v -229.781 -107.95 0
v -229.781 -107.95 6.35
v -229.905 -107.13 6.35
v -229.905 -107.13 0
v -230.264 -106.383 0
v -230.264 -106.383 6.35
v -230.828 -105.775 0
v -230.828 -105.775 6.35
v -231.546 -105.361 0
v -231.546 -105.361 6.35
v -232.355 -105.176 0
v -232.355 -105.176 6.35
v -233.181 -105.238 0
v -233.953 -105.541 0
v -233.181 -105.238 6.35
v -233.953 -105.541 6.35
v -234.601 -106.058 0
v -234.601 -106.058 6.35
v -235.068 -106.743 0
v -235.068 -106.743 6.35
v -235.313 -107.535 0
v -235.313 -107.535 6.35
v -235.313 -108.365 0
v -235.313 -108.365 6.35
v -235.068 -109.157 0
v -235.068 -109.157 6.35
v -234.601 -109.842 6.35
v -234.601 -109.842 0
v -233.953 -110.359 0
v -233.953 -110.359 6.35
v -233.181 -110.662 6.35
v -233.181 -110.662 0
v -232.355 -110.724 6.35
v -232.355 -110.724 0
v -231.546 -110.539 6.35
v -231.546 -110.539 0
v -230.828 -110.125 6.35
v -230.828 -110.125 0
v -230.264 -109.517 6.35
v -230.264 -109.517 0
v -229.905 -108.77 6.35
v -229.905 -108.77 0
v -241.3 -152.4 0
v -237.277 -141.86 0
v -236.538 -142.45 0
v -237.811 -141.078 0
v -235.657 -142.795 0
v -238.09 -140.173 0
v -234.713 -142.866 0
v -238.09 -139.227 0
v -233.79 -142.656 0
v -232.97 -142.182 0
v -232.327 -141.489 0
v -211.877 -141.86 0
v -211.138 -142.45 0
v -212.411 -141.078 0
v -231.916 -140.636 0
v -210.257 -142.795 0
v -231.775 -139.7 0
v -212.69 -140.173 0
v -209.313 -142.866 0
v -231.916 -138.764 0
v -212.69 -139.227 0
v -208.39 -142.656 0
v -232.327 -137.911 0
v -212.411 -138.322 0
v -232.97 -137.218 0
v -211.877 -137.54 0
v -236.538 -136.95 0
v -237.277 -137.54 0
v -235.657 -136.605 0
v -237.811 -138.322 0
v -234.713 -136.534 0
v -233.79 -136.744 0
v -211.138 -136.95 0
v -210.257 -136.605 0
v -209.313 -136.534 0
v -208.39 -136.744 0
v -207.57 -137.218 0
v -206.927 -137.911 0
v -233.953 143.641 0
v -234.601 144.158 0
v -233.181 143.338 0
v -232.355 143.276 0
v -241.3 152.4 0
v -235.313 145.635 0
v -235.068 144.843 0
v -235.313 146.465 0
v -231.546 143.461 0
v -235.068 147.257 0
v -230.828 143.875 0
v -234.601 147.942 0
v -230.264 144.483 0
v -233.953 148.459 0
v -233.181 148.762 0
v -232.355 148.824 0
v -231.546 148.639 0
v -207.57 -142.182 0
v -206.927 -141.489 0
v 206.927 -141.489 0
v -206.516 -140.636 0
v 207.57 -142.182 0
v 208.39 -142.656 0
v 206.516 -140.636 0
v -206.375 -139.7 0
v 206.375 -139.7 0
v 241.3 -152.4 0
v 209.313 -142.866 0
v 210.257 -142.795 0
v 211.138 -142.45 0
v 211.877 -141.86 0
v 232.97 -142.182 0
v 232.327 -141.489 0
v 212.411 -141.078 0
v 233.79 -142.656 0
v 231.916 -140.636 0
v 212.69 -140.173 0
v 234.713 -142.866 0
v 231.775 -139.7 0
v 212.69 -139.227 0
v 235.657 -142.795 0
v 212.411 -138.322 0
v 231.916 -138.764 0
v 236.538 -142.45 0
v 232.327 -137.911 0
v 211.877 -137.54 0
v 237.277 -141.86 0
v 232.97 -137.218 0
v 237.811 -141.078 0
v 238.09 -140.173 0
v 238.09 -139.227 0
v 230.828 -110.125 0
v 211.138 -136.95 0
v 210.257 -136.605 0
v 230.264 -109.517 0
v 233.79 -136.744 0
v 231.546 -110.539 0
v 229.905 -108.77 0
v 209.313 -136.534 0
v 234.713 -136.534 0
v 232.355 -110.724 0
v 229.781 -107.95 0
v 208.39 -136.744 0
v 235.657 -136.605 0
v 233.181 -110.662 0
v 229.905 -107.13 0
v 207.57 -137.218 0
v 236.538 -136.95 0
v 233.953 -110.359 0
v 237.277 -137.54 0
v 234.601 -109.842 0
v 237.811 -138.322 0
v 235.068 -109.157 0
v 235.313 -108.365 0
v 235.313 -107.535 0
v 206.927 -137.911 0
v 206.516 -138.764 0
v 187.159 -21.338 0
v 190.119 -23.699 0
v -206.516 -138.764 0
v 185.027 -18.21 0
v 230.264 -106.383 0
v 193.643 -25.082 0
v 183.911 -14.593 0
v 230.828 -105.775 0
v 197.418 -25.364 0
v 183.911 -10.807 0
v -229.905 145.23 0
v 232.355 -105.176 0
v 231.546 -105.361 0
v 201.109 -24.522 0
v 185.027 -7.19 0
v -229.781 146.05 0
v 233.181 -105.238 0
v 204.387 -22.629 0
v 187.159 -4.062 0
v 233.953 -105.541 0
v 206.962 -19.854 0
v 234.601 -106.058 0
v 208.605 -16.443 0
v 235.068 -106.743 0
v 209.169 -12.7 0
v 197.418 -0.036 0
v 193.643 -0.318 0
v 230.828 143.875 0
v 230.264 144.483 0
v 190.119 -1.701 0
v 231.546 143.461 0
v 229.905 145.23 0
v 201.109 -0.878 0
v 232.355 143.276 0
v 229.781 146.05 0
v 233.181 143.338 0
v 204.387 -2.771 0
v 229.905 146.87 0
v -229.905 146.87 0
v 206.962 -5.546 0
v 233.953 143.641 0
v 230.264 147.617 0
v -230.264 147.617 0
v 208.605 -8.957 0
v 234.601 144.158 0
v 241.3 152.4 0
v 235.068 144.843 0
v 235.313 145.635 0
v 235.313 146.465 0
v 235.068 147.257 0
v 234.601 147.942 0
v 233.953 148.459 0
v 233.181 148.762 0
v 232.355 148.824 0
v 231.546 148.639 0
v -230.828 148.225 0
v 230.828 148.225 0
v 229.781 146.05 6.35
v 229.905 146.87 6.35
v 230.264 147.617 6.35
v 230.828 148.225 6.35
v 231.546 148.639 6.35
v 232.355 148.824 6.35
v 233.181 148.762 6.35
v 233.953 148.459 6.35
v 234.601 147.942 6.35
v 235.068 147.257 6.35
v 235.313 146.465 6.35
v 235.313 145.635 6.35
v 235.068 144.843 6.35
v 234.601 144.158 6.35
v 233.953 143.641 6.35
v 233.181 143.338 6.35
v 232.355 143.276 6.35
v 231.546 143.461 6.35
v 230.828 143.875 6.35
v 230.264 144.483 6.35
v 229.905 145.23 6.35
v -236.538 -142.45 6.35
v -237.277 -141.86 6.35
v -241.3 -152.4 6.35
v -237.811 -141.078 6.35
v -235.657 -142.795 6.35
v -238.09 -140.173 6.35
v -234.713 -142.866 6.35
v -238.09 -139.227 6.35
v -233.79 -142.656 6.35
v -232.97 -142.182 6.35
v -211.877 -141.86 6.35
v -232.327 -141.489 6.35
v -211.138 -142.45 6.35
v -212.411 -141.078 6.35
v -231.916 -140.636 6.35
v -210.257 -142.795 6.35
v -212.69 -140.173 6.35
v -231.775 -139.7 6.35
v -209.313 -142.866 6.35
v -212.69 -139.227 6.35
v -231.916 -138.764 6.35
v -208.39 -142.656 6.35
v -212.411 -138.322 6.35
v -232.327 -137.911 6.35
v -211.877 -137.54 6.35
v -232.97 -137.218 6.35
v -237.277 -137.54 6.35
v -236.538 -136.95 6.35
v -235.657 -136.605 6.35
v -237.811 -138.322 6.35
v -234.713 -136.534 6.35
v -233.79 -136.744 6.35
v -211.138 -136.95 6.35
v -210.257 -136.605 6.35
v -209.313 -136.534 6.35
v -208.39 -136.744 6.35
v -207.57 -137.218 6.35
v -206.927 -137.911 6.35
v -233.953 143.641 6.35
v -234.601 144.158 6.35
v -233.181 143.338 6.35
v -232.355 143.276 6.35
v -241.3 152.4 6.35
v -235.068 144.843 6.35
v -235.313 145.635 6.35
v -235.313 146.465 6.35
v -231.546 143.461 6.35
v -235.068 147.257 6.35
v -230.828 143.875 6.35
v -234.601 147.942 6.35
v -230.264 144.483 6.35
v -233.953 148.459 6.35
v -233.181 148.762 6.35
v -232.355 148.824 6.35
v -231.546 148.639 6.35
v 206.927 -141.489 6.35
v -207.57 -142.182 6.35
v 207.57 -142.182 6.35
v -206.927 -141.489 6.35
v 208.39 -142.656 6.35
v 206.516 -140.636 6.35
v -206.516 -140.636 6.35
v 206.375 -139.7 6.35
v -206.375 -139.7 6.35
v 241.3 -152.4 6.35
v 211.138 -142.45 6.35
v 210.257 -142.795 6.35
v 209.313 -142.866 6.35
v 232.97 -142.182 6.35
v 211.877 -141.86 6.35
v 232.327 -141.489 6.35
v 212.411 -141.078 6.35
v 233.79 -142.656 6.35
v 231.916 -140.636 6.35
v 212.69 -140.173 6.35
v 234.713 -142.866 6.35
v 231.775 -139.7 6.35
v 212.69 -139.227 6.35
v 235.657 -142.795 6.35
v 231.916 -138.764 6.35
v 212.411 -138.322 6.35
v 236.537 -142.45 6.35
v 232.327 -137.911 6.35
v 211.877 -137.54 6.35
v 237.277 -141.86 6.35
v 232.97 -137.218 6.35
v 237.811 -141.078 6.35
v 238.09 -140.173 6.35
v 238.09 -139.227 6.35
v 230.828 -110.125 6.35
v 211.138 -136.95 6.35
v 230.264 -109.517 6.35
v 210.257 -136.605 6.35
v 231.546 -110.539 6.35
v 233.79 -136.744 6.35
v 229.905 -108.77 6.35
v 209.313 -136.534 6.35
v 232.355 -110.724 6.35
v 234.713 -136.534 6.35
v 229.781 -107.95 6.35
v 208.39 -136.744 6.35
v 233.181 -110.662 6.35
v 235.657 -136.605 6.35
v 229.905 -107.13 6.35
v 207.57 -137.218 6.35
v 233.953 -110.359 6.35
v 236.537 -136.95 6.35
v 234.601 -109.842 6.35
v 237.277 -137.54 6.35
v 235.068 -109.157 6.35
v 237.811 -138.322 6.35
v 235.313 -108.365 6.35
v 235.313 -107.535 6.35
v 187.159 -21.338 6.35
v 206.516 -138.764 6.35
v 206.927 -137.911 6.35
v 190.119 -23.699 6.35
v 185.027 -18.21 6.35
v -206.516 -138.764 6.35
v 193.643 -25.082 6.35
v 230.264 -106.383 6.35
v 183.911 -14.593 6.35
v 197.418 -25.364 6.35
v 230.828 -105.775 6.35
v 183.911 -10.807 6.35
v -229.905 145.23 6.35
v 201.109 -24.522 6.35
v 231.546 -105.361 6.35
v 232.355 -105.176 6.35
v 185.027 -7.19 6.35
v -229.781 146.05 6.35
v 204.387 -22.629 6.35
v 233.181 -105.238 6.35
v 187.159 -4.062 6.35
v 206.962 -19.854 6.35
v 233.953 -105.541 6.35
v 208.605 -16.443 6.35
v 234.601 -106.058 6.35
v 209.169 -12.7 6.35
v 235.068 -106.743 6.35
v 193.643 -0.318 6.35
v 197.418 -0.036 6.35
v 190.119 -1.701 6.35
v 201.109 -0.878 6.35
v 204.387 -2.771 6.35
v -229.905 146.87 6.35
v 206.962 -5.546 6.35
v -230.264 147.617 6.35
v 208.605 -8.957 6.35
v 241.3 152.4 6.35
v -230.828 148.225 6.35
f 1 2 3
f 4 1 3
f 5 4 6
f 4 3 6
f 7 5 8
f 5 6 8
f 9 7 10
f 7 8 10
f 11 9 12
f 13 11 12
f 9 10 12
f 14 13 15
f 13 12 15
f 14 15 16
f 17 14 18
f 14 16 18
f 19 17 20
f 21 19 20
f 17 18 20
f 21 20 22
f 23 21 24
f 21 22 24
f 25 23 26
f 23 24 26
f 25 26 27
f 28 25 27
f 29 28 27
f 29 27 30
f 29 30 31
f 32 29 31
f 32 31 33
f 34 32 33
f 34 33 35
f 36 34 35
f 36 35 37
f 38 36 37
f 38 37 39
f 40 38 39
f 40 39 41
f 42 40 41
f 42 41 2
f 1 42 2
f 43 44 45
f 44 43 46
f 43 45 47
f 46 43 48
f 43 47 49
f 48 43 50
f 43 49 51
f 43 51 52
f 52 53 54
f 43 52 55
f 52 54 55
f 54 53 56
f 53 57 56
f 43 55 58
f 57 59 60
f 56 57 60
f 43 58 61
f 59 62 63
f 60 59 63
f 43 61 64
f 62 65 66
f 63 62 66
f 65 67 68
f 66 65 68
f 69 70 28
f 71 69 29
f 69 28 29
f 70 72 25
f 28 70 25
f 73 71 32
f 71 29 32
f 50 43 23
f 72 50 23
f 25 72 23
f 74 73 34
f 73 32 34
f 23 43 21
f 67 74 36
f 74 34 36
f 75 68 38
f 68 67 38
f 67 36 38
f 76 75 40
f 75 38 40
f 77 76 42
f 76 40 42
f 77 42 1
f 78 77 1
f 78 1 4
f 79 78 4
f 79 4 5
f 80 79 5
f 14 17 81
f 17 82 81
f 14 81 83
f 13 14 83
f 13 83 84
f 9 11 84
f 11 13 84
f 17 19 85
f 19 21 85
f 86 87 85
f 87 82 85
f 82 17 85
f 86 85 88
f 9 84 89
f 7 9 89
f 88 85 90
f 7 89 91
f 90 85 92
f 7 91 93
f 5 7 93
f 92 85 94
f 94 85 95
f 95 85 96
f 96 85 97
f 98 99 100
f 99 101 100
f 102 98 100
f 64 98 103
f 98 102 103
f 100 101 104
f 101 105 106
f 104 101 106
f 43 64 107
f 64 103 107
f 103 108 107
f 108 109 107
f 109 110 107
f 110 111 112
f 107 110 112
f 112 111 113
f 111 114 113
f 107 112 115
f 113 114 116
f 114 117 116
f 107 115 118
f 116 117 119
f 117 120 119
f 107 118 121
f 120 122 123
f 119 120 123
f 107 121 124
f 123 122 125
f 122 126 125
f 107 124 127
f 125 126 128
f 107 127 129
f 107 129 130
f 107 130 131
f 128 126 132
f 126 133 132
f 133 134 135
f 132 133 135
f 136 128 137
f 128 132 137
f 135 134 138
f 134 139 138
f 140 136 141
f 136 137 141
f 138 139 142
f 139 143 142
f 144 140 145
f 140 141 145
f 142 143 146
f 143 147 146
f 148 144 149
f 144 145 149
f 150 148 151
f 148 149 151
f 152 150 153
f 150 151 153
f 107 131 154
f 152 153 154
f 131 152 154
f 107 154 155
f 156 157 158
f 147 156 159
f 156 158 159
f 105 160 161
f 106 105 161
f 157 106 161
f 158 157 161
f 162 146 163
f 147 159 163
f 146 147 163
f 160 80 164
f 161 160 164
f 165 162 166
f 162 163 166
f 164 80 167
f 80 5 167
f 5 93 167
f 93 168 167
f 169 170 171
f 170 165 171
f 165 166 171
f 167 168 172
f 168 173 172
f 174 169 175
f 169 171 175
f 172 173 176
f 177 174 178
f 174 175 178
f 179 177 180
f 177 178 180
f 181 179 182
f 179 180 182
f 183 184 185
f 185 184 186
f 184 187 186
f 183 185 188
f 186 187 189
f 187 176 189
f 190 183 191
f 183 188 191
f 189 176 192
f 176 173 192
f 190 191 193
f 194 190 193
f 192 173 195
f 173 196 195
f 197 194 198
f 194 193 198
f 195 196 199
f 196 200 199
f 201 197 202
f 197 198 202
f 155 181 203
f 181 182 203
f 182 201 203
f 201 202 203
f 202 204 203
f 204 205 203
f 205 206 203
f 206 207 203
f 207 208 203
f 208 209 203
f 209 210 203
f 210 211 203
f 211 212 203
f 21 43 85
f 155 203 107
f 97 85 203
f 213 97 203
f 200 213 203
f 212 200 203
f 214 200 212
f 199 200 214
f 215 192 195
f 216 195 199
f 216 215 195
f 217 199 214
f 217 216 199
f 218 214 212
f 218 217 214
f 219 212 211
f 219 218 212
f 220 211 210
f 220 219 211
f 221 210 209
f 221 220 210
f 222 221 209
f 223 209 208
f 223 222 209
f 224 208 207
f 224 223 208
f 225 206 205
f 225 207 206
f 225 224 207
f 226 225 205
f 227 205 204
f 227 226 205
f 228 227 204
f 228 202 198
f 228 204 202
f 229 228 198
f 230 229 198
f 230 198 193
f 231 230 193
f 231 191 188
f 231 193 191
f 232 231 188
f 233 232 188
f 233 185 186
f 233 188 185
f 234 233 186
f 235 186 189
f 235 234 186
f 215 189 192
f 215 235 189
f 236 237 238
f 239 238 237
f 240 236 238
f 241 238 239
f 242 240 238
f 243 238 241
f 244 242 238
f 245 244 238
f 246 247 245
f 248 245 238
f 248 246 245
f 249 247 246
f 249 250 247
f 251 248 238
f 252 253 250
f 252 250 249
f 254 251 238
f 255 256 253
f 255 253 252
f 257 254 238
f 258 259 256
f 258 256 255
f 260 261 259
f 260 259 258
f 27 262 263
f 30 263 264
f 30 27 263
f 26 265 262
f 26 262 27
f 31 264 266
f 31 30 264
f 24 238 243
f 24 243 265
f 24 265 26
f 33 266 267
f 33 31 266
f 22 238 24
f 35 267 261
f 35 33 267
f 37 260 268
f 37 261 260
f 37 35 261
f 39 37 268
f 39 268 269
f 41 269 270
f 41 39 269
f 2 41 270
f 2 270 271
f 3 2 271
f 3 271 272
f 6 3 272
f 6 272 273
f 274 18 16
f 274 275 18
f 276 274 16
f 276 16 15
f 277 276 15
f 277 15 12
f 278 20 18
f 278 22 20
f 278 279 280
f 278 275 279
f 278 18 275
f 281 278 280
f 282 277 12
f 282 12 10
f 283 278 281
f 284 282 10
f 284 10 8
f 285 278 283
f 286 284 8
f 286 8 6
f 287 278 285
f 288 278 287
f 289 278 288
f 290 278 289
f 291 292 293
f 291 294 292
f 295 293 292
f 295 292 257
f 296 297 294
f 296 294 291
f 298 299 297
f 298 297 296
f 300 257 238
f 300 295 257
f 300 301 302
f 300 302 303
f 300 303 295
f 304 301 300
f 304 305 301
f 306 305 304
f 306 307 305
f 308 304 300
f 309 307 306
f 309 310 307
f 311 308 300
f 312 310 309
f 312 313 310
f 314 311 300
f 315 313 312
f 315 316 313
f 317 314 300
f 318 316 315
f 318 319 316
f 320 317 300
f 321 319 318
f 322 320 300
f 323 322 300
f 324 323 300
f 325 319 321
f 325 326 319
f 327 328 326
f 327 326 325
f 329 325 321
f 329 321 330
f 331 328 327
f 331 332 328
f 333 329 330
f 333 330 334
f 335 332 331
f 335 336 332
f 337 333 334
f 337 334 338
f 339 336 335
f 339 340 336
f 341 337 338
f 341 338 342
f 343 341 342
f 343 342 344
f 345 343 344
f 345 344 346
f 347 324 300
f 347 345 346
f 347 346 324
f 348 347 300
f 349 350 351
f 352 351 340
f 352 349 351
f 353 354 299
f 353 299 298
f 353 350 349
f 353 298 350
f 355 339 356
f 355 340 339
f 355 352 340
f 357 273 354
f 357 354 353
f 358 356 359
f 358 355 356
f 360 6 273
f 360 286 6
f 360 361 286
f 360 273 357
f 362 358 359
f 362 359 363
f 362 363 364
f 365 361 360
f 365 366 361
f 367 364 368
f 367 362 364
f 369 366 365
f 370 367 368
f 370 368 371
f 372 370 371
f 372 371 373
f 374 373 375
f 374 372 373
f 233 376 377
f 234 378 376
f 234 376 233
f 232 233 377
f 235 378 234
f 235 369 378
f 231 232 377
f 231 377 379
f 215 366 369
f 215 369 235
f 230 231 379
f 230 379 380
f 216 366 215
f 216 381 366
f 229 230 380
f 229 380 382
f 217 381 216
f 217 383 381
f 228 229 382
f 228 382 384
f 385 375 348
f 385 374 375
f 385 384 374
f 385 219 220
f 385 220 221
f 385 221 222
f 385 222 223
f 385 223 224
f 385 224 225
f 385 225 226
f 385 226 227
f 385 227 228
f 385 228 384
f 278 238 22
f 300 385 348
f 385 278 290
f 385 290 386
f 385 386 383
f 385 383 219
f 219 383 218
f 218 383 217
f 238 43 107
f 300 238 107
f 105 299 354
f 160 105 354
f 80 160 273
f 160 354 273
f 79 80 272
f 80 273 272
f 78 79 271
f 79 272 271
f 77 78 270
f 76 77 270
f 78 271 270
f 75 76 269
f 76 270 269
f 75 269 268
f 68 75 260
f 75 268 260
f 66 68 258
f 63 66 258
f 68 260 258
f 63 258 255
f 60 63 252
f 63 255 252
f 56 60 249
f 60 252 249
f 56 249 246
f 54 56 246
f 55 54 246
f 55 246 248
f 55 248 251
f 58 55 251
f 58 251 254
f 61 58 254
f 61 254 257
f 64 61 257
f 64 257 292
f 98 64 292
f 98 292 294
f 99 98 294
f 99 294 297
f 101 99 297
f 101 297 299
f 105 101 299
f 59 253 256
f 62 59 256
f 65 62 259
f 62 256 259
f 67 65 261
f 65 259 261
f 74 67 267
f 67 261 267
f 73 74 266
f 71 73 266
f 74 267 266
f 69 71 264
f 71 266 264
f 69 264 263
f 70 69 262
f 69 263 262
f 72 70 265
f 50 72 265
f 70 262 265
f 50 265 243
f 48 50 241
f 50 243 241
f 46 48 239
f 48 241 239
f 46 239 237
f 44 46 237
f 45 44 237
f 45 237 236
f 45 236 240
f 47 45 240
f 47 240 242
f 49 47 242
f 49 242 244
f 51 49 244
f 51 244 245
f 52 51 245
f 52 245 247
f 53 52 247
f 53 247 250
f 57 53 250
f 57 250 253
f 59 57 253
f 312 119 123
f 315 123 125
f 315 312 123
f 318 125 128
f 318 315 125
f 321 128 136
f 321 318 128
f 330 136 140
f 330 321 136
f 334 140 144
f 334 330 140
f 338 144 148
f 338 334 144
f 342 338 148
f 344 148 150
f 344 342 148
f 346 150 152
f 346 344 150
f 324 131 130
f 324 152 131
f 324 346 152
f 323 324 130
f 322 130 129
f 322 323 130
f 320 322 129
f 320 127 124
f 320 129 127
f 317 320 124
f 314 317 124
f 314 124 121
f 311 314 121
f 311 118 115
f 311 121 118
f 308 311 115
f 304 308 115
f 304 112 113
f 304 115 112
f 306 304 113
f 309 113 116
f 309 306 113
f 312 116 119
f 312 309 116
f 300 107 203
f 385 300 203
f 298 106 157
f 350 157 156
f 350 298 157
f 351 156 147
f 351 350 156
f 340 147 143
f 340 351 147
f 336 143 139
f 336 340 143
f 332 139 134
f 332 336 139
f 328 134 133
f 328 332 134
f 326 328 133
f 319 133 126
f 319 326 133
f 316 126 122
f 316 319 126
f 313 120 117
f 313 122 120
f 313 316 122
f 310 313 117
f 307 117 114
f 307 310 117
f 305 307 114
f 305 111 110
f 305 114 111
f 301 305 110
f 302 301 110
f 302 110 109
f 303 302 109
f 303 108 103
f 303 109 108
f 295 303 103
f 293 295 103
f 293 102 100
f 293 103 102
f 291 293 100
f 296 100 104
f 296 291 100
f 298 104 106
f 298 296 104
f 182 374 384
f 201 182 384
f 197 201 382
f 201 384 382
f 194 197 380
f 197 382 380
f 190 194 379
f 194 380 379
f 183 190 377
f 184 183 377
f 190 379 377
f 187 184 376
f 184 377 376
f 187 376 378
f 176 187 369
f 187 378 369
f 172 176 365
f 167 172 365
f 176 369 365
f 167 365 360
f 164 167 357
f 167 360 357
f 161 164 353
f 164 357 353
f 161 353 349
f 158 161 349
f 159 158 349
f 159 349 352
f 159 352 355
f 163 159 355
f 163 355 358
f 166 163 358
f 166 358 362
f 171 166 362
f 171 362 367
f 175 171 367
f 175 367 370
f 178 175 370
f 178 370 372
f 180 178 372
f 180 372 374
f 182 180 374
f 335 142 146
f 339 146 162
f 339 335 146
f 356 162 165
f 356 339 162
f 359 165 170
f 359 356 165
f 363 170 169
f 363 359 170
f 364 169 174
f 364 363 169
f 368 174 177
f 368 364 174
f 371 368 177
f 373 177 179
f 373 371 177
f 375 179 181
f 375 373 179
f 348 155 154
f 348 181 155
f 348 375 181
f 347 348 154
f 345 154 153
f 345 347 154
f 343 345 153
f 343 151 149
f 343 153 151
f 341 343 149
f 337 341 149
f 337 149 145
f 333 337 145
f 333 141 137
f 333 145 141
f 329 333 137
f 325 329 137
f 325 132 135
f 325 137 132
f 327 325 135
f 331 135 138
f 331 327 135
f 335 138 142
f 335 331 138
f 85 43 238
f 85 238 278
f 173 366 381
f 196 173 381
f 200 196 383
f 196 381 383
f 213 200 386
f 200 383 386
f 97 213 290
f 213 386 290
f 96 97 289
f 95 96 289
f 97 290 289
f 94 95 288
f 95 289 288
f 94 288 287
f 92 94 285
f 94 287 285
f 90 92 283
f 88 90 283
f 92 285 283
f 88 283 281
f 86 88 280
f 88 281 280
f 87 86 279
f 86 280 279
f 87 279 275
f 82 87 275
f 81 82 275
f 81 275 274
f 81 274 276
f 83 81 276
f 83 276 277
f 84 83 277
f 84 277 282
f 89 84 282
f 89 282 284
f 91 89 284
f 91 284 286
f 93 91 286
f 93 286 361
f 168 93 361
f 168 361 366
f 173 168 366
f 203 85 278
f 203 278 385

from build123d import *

# Parameters (mm, degrees)
SKETCH1_W           = 482.6
SKETCH1_H           = 304.8
BOSS_EXTRUDE1_DEPTH = 6.35
SKETCH2_R           = 2.7813
CUT_EXTRUDE1_DEPTH  = 286.467638271
SKETCH3_R           = 3.175
CUT_EXTRUDE2_DEPTH  = 286.467638271
SKETCH4_R           = 12.7
CUT_EXTRUDE3_DEPTH  = 286.467638271


with BuildPart() as part:
    # Sketch1 → Boss-Extrude1 (new body)
    with BuildSketch(Plane.XY):
        Rectangle(SKETCH1_W, SKETCH1_H)
    extrude(amount=BOSS_EXTRUDE1_DEPTH)

    # Sketch2 → Cut-Extrude1 (cut, through all)
    with BuildSketch(Plane.XY.offset(6.35)):
        with Locations((-232.5624, 146.05)):
            Circle(SKETCH2_R)
        with Locations((-232.5624, -107.95)):
            Circle(SKETCH2_R)
    cut_extrude1 = extrude(amount=-CUT_EXTRUDE1_DEPTH, mode=Mode.SUBTRACT)

    # Mirror1: Cut-Extrude1 across plane
    add(cut_extrude1.mirror(Plane(origin=(0, 0, 0), x_dir=(0, 0, 1), z_dir=(1, 0, 0))), mode=Mode.SUBTRACT)

    # Sketch3 → Cut-Extrude2 (cut, through all)
    with BuildSketch(Plane.XY.offset(6.35)):
        with Locations((-234.95, -139.7)):
            Circle(SKETCH3_R)
        with Locations((-209.55, -139.7)):
            Circle(SKETCH3_R)
    cut_extrude2 = extrude(amount=-CUT_EXTRUDE2_DEPTH, mode=Mode.SUBTRACT)

    # Mirror2: Cut-Extrude2 across plane
    add(cut_extrude2.mirror(Plane(origin=(0, 0, 0), x_dir=(0, 0, 1), z_dir=(1, 0, 0))), mode=Mode.SUBTRACT)

    # Sketch4 → Cut-Extrude3 (cut, through all)
    with BuildSketch(Plane.XY.offset(6.35)):
        with Locations((196.469, -12.7)):
            Circle(SKETCH4_R)
    extrude(amount=-CUT_EXTRUDE3_DEPTH, mode=Mode.SUBTRACT)


solid = part.part
